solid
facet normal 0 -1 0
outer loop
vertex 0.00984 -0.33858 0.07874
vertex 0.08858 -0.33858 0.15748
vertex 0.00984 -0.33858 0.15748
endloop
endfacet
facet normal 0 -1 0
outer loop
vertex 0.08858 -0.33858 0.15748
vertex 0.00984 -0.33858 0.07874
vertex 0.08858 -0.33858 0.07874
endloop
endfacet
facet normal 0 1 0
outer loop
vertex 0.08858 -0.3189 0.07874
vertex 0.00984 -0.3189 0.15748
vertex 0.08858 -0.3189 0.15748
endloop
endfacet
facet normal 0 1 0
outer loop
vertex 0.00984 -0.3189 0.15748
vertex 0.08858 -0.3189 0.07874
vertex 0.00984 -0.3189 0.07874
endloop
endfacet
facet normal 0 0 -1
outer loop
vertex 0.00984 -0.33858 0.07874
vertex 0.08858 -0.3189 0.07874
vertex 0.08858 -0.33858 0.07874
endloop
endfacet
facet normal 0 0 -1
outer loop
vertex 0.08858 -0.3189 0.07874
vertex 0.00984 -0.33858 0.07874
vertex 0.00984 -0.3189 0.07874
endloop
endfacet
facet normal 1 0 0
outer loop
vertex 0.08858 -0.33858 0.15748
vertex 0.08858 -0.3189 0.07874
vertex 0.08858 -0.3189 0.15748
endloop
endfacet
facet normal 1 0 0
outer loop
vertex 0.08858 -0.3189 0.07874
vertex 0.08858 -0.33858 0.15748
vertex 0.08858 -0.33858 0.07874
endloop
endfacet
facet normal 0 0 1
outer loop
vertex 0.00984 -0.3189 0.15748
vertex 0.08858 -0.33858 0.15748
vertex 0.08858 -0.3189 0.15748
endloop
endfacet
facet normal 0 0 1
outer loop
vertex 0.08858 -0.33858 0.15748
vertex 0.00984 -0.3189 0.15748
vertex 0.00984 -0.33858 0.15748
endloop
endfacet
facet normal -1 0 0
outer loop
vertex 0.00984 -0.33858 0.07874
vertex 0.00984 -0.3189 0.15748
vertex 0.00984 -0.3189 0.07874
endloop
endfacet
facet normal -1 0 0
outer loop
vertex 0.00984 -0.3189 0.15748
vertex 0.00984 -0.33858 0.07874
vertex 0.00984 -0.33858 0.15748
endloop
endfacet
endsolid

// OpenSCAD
// file: defines.scad
Wb = 1.65;
Hb = 0.68;
H =  1.15;
Wf = 1.20;
Fo = 0.10;

scale = 1/2.54;
// main file
include <defines.scad>

Eh = 0.05;

// Label
scale(scale) color("Blue") translate([0, Hb/2 - H - Eh/2, 0.6/2]) rotate([90,0,0]){

  translate([1.65/2 - 0.70, 0, 0]) cube([0.2, 0.2, Eh], center=true);
}
